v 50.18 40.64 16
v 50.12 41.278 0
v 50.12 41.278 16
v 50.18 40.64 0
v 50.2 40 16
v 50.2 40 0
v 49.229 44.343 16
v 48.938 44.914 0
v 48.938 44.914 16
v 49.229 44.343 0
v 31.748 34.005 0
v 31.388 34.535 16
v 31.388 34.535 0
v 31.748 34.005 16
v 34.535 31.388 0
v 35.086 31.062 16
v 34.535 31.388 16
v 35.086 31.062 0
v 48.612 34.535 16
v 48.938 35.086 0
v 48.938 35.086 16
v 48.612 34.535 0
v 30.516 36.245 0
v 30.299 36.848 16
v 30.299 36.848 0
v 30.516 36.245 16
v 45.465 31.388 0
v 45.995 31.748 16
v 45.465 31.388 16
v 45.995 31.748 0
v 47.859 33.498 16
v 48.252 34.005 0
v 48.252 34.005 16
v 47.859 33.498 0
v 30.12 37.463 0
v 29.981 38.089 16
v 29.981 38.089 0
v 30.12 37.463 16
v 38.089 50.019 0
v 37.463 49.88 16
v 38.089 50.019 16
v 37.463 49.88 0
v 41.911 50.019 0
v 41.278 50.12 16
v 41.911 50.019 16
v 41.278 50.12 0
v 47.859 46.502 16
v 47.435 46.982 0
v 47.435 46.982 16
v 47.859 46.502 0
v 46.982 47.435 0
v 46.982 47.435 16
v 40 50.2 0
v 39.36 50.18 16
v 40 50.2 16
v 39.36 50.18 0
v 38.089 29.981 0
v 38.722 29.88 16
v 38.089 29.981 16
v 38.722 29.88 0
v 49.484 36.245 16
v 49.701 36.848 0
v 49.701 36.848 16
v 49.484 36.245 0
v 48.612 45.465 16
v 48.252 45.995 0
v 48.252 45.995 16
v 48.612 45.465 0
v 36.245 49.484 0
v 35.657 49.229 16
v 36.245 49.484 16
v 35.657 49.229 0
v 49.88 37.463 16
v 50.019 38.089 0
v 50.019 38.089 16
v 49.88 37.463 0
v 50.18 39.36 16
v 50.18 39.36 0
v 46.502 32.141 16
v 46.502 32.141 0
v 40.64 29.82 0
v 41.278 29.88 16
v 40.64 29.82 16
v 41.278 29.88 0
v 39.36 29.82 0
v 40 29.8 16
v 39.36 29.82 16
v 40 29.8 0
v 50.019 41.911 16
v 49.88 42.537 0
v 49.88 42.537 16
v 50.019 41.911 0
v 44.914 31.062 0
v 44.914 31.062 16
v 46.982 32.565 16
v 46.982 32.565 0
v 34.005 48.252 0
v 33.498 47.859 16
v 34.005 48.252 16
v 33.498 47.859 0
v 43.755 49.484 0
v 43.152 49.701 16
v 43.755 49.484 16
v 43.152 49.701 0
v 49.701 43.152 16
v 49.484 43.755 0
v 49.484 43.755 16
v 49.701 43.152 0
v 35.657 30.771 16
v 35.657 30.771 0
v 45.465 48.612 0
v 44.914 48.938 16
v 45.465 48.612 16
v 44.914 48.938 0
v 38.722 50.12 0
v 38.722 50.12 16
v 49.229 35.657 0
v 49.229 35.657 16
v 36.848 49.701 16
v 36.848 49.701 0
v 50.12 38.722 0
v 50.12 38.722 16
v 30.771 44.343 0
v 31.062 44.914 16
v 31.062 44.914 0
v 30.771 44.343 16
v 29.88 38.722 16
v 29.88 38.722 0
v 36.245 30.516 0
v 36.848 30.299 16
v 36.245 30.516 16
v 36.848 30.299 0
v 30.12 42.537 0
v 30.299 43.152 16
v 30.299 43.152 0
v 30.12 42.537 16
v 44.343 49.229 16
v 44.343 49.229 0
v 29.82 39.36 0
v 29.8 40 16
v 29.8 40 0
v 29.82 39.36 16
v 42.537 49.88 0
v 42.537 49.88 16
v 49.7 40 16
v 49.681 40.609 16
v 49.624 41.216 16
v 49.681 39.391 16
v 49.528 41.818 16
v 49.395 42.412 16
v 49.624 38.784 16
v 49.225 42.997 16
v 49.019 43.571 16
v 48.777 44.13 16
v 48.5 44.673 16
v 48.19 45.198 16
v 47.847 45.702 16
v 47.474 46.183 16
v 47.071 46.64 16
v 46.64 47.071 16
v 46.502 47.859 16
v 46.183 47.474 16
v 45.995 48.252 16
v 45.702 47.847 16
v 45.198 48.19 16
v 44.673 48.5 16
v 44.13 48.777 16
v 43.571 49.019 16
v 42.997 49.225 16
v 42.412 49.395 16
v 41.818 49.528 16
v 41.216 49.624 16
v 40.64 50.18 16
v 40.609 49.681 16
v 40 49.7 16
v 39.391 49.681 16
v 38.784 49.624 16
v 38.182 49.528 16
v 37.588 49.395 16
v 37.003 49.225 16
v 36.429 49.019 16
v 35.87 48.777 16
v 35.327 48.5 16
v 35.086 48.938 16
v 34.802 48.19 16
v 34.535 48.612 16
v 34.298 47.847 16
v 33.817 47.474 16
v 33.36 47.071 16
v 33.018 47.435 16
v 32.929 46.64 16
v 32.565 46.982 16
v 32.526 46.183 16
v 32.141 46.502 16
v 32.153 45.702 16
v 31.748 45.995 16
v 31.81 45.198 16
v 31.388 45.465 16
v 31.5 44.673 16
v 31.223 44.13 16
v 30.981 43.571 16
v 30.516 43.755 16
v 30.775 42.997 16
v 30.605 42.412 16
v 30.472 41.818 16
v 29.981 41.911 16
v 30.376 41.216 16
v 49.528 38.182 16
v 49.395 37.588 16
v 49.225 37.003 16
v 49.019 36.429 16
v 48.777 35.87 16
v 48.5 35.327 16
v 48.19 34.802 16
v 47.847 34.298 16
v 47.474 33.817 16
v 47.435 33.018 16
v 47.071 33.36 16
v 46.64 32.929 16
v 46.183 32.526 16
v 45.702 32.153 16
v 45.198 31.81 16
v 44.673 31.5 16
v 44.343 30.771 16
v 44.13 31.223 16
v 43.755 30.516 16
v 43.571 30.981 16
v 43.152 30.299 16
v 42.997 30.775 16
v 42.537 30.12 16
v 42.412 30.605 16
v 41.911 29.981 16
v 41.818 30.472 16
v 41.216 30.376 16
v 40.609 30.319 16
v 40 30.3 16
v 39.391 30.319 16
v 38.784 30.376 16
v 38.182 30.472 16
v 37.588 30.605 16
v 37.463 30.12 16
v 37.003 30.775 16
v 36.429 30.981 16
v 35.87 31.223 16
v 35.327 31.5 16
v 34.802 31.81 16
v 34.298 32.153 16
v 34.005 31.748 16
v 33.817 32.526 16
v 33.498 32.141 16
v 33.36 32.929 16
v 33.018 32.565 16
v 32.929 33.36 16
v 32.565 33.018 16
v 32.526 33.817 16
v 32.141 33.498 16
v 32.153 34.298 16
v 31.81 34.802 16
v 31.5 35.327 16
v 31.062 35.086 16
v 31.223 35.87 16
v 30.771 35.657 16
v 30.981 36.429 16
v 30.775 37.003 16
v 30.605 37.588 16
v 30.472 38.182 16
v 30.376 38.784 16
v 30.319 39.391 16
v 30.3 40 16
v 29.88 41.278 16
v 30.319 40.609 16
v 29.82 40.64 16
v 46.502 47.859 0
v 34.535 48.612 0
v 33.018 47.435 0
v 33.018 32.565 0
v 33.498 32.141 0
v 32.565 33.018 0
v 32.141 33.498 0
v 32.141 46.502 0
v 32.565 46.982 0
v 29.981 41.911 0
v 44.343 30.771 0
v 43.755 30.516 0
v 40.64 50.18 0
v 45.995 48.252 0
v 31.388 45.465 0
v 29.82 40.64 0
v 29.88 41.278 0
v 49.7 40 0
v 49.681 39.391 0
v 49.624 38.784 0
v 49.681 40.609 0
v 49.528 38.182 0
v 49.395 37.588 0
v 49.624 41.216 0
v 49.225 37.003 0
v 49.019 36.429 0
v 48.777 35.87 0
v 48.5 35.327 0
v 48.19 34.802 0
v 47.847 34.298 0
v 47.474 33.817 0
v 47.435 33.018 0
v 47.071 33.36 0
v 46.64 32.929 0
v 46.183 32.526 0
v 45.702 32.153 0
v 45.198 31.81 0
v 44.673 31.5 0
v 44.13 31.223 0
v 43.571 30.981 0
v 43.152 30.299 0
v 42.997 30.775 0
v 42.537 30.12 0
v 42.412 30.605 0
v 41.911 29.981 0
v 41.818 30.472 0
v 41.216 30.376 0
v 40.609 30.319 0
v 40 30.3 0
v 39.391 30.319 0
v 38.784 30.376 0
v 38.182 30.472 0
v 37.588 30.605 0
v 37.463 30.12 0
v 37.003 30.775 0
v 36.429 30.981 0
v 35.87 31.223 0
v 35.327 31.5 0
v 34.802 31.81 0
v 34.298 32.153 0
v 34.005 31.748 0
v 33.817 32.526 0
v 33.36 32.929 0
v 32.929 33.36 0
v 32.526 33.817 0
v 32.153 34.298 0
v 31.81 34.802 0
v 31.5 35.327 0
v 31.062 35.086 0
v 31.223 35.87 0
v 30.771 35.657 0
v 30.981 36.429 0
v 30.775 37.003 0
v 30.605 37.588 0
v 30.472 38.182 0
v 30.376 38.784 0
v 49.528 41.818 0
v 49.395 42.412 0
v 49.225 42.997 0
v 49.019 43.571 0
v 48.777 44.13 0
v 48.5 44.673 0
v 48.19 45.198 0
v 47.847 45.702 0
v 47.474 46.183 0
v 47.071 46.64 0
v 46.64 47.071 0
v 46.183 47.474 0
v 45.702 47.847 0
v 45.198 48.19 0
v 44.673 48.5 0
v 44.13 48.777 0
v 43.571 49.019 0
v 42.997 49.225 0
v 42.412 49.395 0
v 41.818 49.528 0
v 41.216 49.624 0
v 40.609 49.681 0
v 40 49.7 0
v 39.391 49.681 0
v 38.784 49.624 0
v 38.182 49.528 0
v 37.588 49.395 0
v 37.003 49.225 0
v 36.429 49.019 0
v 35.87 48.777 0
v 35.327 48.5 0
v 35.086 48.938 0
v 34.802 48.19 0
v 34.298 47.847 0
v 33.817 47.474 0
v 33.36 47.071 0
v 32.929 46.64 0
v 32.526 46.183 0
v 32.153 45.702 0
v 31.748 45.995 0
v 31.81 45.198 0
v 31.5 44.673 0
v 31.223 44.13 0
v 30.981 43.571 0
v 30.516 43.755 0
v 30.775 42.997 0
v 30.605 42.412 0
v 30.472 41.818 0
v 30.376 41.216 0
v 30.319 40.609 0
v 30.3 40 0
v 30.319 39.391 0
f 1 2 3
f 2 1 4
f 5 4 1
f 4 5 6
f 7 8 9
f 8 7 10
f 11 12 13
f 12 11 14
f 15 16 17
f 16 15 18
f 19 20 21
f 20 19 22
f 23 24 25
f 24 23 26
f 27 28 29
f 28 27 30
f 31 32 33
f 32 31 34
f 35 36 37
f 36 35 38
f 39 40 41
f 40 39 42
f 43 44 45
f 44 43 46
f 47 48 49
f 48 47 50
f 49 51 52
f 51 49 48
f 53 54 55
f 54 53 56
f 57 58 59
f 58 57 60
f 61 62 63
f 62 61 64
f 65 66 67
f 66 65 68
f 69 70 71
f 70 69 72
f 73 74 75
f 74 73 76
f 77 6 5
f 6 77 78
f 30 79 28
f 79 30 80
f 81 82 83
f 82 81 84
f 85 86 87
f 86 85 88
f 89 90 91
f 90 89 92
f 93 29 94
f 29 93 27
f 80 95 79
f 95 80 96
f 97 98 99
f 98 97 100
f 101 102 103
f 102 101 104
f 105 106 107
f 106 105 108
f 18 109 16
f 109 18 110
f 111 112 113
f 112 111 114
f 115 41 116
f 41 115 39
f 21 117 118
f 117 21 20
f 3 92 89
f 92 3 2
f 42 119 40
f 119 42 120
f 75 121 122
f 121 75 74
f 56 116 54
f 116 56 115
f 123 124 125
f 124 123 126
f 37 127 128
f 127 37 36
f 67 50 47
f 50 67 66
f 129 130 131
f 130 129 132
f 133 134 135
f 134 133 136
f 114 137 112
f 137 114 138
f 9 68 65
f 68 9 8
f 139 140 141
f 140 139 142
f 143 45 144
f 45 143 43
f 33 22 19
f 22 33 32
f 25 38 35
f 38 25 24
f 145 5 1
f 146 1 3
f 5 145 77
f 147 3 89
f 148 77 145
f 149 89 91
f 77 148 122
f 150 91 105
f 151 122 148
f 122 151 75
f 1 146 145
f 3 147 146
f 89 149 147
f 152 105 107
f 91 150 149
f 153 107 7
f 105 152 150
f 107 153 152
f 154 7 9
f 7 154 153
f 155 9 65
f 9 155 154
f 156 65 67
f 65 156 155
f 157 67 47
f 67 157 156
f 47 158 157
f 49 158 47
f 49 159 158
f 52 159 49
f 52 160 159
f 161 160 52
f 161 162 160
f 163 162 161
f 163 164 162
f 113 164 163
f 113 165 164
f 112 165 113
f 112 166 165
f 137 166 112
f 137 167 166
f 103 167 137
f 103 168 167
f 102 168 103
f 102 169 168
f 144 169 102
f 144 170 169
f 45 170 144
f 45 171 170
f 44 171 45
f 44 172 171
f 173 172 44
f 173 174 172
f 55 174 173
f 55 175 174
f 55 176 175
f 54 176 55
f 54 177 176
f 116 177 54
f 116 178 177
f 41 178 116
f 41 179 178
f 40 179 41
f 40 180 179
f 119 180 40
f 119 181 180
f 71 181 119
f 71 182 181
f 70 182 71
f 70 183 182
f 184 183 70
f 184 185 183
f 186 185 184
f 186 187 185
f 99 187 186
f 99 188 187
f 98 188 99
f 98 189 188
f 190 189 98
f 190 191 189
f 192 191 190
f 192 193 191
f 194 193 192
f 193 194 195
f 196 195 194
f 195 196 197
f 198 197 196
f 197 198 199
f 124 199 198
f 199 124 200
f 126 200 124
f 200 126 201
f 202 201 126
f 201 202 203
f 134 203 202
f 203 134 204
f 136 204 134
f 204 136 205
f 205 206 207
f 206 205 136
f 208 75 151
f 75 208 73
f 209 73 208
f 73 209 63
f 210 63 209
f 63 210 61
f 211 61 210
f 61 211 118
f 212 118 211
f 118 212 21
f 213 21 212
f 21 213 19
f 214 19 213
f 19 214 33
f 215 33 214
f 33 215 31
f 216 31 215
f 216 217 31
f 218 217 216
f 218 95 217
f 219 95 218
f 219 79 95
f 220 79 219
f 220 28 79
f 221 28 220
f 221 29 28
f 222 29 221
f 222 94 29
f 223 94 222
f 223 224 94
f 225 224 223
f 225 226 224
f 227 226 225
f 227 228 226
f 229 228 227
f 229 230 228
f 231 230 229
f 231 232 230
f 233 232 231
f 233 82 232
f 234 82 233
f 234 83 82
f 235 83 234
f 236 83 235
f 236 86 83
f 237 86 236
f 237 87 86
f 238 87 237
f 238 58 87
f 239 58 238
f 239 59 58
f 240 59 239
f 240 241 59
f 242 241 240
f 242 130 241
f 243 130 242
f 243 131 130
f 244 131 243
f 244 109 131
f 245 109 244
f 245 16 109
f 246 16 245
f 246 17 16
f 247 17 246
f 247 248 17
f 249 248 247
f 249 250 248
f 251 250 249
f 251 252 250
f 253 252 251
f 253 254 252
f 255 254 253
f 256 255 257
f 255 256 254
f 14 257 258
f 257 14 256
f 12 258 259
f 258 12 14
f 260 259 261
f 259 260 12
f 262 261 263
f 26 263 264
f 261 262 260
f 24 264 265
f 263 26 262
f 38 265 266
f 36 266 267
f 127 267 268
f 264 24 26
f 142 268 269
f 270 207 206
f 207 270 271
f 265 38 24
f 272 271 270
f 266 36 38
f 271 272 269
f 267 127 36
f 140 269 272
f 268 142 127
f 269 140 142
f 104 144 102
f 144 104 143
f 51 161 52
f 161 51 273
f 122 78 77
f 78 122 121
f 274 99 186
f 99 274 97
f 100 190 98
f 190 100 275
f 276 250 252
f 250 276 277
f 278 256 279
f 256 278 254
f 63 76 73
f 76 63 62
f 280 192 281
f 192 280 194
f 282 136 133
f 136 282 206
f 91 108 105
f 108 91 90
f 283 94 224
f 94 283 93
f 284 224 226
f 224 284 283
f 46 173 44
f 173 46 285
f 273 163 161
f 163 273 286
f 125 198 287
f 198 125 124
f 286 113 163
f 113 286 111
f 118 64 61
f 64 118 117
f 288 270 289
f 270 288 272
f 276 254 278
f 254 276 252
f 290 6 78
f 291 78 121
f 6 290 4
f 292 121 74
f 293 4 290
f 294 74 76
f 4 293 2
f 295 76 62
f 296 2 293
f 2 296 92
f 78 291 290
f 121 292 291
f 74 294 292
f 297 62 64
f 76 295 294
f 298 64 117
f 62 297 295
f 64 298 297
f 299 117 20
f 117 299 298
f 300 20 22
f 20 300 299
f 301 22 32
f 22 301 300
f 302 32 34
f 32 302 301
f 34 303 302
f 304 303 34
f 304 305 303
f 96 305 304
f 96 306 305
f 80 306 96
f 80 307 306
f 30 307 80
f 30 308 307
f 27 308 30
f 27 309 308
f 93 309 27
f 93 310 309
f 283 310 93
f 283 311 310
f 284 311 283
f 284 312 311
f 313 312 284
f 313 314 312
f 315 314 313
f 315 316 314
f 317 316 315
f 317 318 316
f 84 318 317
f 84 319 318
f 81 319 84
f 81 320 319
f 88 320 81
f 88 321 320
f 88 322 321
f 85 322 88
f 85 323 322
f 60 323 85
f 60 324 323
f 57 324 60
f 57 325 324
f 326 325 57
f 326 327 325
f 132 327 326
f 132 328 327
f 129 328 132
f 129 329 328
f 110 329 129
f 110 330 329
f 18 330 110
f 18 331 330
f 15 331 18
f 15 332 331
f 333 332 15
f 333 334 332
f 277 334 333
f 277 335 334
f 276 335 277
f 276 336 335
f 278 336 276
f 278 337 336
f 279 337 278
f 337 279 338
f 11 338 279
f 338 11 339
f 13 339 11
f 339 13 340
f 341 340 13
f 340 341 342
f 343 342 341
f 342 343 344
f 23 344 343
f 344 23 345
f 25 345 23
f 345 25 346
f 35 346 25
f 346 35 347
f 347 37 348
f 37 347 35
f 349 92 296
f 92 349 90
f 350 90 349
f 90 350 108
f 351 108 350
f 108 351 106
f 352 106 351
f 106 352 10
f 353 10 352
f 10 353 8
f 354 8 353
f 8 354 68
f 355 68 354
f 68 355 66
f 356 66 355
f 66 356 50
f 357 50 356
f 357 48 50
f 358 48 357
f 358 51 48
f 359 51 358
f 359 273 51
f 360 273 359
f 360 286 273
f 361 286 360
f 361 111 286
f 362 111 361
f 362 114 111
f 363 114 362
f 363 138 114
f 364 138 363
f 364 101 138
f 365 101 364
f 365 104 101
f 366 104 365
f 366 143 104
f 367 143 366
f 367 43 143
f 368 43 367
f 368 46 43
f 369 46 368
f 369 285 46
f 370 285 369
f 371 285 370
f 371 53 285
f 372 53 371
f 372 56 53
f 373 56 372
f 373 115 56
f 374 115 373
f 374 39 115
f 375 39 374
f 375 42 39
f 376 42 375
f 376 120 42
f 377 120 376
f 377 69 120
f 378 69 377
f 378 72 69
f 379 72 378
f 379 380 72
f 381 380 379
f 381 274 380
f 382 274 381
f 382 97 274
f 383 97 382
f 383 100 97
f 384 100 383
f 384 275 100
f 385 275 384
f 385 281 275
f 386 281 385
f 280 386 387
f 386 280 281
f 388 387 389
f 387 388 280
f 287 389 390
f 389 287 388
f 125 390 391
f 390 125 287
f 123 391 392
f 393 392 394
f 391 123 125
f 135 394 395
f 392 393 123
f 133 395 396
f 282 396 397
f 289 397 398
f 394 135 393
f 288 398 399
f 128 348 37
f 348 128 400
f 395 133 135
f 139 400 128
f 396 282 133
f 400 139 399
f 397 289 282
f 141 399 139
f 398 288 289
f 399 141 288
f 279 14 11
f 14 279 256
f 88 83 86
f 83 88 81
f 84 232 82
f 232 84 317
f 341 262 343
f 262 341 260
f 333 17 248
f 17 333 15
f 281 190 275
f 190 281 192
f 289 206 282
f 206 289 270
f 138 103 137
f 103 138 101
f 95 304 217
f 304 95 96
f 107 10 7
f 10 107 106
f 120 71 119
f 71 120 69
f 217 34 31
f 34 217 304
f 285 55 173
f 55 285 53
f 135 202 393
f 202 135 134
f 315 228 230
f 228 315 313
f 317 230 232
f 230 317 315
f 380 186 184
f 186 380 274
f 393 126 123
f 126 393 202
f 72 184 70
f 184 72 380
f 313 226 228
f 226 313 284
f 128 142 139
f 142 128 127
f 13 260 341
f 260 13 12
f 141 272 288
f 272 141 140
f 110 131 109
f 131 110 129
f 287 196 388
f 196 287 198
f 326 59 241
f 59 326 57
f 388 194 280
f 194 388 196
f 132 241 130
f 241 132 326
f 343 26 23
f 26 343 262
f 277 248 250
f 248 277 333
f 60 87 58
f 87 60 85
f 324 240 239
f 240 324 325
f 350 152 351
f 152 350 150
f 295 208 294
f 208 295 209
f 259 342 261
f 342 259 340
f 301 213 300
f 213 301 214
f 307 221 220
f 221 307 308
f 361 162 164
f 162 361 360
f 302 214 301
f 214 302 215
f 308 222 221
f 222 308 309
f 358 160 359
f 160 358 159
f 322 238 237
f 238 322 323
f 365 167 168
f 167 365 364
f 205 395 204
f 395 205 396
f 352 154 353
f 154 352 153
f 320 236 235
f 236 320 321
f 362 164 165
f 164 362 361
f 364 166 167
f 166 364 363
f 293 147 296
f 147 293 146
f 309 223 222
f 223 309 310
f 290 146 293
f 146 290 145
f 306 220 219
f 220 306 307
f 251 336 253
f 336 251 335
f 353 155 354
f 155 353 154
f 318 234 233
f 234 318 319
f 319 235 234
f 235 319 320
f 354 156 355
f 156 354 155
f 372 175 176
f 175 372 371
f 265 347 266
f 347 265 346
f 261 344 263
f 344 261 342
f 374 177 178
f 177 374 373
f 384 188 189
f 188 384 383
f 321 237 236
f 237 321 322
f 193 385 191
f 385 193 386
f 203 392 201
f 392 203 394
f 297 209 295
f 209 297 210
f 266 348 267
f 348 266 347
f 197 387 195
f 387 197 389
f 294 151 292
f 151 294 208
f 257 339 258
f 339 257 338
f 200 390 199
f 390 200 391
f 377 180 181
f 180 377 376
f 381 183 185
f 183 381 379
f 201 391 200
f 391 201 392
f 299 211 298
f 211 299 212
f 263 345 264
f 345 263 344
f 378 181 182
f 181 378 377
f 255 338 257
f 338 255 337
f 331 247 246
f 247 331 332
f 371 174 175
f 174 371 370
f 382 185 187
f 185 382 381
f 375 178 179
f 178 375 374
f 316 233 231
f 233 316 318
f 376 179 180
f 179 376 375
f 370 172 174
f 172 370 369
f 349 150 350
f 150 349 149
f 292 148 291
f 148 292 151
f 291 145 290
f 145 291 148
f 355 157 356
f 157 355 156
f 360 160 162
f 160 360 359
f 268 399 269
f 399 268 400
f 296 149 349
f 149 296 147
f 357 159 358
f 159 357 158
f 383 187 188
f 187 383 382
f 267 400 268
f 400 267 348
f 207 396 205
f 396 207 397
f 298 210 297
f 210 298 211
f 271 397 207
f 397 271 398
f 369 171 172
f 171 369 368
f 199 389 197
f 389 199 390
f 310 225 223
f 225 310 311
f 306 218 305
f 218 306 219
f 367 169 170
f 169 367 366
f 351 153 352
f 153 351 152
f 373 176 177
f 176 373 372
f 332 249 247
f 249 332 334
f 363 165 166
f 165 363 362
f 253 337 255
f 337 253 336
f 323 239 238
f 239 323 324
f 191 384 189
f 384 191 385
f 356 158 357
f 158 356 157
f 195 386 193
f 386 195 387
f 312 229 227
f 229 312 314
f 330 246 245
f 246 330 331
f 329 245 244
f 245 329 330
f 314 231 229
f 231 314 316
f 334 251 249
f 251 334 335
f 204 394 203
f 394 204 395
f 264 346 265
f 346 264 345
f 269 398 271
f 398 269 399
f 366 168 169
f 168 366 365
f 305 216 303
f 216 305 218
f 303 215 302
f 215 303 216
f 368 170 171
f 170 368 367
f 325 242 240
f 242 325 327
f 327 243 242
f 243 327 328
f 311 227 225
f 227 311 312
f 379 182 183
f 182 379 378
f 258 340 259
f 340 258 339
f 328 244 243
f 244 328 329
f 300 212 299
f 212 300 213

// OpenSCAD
/* 
 Copyright (c) 2021.  Jacques Parker

Permission is hereby granted, free of charge, to any person
obtaining a copy of this software and associated documentation
files (the "Software"), to deal in the Software without restriction, 
including without limitation the rights to use, copy, modify,
merge, publish, distribute, sublicense, and/or sell copies of the
Software, and to permit persons to whom the Software is furnished 
to do so, subject to the following conditions: 

The above copyright notice and this permission notice shall be
included in all copies or substantial portions of # the Software. 

THE SOFTWARE IS PROVIDED "AS IS", WITHOUT WARRANTY OF ANY KIND,
EXPRESS OR IMPLIED, INCLUDING BUT NOT LIMITED TO THE WARRANTIES 
OF MERCHANTABILITY, FITNESS FOR A PARTICULAR PURPOSE AND 
NONINFRINGEMENT. IN NO EVENT SHALL THE AUTHORS OR COPYRIGHT 
HOLDERS BE LIABLE FOR ANY CLAIM, DAMAGES OR OTHER LIABILITY,
WHETHER IN AN ACTION OF CONTRACT, TORT OR OTHERWISE, ARISING 
FROM, OUT OF OR IN CONNECTION WITH THE SOFTWARE OR THE USE OR 
OTHER DEALINGS IN THE SOFTWARE. 

MIT License  copyright@judyandjacques.com

*/

$fn = 100;

LED_DIAMETER = 18.9;
LED_HEIGHT = 16;

module ring(delta, label = "") {
    difference() {
        union() {
            cylinder(d=LED_DIAMETER+delta+1, h=LED_HEIGHT);
            
            if (len(label) > 0) {
                translate([(LED_DIAMETER+delta+1)/2-2, -5, 0])
                cube([12, 10, 2]);
               
                color("red")
                translate([(LED_DIAMETER+delta+1)/2+5, -4.75, 1.5])
                linear_extrude(height = 2)
                text(text = label, 
                    font="Liberation Sans", 
                    size = 9, 
                    halign = "center");
            }
        }

        cylinder(d=LED_DIAMETER+delta, h=LED_HEIGHT);
    }
}

translate([40,40,0])
ring(0.5);
